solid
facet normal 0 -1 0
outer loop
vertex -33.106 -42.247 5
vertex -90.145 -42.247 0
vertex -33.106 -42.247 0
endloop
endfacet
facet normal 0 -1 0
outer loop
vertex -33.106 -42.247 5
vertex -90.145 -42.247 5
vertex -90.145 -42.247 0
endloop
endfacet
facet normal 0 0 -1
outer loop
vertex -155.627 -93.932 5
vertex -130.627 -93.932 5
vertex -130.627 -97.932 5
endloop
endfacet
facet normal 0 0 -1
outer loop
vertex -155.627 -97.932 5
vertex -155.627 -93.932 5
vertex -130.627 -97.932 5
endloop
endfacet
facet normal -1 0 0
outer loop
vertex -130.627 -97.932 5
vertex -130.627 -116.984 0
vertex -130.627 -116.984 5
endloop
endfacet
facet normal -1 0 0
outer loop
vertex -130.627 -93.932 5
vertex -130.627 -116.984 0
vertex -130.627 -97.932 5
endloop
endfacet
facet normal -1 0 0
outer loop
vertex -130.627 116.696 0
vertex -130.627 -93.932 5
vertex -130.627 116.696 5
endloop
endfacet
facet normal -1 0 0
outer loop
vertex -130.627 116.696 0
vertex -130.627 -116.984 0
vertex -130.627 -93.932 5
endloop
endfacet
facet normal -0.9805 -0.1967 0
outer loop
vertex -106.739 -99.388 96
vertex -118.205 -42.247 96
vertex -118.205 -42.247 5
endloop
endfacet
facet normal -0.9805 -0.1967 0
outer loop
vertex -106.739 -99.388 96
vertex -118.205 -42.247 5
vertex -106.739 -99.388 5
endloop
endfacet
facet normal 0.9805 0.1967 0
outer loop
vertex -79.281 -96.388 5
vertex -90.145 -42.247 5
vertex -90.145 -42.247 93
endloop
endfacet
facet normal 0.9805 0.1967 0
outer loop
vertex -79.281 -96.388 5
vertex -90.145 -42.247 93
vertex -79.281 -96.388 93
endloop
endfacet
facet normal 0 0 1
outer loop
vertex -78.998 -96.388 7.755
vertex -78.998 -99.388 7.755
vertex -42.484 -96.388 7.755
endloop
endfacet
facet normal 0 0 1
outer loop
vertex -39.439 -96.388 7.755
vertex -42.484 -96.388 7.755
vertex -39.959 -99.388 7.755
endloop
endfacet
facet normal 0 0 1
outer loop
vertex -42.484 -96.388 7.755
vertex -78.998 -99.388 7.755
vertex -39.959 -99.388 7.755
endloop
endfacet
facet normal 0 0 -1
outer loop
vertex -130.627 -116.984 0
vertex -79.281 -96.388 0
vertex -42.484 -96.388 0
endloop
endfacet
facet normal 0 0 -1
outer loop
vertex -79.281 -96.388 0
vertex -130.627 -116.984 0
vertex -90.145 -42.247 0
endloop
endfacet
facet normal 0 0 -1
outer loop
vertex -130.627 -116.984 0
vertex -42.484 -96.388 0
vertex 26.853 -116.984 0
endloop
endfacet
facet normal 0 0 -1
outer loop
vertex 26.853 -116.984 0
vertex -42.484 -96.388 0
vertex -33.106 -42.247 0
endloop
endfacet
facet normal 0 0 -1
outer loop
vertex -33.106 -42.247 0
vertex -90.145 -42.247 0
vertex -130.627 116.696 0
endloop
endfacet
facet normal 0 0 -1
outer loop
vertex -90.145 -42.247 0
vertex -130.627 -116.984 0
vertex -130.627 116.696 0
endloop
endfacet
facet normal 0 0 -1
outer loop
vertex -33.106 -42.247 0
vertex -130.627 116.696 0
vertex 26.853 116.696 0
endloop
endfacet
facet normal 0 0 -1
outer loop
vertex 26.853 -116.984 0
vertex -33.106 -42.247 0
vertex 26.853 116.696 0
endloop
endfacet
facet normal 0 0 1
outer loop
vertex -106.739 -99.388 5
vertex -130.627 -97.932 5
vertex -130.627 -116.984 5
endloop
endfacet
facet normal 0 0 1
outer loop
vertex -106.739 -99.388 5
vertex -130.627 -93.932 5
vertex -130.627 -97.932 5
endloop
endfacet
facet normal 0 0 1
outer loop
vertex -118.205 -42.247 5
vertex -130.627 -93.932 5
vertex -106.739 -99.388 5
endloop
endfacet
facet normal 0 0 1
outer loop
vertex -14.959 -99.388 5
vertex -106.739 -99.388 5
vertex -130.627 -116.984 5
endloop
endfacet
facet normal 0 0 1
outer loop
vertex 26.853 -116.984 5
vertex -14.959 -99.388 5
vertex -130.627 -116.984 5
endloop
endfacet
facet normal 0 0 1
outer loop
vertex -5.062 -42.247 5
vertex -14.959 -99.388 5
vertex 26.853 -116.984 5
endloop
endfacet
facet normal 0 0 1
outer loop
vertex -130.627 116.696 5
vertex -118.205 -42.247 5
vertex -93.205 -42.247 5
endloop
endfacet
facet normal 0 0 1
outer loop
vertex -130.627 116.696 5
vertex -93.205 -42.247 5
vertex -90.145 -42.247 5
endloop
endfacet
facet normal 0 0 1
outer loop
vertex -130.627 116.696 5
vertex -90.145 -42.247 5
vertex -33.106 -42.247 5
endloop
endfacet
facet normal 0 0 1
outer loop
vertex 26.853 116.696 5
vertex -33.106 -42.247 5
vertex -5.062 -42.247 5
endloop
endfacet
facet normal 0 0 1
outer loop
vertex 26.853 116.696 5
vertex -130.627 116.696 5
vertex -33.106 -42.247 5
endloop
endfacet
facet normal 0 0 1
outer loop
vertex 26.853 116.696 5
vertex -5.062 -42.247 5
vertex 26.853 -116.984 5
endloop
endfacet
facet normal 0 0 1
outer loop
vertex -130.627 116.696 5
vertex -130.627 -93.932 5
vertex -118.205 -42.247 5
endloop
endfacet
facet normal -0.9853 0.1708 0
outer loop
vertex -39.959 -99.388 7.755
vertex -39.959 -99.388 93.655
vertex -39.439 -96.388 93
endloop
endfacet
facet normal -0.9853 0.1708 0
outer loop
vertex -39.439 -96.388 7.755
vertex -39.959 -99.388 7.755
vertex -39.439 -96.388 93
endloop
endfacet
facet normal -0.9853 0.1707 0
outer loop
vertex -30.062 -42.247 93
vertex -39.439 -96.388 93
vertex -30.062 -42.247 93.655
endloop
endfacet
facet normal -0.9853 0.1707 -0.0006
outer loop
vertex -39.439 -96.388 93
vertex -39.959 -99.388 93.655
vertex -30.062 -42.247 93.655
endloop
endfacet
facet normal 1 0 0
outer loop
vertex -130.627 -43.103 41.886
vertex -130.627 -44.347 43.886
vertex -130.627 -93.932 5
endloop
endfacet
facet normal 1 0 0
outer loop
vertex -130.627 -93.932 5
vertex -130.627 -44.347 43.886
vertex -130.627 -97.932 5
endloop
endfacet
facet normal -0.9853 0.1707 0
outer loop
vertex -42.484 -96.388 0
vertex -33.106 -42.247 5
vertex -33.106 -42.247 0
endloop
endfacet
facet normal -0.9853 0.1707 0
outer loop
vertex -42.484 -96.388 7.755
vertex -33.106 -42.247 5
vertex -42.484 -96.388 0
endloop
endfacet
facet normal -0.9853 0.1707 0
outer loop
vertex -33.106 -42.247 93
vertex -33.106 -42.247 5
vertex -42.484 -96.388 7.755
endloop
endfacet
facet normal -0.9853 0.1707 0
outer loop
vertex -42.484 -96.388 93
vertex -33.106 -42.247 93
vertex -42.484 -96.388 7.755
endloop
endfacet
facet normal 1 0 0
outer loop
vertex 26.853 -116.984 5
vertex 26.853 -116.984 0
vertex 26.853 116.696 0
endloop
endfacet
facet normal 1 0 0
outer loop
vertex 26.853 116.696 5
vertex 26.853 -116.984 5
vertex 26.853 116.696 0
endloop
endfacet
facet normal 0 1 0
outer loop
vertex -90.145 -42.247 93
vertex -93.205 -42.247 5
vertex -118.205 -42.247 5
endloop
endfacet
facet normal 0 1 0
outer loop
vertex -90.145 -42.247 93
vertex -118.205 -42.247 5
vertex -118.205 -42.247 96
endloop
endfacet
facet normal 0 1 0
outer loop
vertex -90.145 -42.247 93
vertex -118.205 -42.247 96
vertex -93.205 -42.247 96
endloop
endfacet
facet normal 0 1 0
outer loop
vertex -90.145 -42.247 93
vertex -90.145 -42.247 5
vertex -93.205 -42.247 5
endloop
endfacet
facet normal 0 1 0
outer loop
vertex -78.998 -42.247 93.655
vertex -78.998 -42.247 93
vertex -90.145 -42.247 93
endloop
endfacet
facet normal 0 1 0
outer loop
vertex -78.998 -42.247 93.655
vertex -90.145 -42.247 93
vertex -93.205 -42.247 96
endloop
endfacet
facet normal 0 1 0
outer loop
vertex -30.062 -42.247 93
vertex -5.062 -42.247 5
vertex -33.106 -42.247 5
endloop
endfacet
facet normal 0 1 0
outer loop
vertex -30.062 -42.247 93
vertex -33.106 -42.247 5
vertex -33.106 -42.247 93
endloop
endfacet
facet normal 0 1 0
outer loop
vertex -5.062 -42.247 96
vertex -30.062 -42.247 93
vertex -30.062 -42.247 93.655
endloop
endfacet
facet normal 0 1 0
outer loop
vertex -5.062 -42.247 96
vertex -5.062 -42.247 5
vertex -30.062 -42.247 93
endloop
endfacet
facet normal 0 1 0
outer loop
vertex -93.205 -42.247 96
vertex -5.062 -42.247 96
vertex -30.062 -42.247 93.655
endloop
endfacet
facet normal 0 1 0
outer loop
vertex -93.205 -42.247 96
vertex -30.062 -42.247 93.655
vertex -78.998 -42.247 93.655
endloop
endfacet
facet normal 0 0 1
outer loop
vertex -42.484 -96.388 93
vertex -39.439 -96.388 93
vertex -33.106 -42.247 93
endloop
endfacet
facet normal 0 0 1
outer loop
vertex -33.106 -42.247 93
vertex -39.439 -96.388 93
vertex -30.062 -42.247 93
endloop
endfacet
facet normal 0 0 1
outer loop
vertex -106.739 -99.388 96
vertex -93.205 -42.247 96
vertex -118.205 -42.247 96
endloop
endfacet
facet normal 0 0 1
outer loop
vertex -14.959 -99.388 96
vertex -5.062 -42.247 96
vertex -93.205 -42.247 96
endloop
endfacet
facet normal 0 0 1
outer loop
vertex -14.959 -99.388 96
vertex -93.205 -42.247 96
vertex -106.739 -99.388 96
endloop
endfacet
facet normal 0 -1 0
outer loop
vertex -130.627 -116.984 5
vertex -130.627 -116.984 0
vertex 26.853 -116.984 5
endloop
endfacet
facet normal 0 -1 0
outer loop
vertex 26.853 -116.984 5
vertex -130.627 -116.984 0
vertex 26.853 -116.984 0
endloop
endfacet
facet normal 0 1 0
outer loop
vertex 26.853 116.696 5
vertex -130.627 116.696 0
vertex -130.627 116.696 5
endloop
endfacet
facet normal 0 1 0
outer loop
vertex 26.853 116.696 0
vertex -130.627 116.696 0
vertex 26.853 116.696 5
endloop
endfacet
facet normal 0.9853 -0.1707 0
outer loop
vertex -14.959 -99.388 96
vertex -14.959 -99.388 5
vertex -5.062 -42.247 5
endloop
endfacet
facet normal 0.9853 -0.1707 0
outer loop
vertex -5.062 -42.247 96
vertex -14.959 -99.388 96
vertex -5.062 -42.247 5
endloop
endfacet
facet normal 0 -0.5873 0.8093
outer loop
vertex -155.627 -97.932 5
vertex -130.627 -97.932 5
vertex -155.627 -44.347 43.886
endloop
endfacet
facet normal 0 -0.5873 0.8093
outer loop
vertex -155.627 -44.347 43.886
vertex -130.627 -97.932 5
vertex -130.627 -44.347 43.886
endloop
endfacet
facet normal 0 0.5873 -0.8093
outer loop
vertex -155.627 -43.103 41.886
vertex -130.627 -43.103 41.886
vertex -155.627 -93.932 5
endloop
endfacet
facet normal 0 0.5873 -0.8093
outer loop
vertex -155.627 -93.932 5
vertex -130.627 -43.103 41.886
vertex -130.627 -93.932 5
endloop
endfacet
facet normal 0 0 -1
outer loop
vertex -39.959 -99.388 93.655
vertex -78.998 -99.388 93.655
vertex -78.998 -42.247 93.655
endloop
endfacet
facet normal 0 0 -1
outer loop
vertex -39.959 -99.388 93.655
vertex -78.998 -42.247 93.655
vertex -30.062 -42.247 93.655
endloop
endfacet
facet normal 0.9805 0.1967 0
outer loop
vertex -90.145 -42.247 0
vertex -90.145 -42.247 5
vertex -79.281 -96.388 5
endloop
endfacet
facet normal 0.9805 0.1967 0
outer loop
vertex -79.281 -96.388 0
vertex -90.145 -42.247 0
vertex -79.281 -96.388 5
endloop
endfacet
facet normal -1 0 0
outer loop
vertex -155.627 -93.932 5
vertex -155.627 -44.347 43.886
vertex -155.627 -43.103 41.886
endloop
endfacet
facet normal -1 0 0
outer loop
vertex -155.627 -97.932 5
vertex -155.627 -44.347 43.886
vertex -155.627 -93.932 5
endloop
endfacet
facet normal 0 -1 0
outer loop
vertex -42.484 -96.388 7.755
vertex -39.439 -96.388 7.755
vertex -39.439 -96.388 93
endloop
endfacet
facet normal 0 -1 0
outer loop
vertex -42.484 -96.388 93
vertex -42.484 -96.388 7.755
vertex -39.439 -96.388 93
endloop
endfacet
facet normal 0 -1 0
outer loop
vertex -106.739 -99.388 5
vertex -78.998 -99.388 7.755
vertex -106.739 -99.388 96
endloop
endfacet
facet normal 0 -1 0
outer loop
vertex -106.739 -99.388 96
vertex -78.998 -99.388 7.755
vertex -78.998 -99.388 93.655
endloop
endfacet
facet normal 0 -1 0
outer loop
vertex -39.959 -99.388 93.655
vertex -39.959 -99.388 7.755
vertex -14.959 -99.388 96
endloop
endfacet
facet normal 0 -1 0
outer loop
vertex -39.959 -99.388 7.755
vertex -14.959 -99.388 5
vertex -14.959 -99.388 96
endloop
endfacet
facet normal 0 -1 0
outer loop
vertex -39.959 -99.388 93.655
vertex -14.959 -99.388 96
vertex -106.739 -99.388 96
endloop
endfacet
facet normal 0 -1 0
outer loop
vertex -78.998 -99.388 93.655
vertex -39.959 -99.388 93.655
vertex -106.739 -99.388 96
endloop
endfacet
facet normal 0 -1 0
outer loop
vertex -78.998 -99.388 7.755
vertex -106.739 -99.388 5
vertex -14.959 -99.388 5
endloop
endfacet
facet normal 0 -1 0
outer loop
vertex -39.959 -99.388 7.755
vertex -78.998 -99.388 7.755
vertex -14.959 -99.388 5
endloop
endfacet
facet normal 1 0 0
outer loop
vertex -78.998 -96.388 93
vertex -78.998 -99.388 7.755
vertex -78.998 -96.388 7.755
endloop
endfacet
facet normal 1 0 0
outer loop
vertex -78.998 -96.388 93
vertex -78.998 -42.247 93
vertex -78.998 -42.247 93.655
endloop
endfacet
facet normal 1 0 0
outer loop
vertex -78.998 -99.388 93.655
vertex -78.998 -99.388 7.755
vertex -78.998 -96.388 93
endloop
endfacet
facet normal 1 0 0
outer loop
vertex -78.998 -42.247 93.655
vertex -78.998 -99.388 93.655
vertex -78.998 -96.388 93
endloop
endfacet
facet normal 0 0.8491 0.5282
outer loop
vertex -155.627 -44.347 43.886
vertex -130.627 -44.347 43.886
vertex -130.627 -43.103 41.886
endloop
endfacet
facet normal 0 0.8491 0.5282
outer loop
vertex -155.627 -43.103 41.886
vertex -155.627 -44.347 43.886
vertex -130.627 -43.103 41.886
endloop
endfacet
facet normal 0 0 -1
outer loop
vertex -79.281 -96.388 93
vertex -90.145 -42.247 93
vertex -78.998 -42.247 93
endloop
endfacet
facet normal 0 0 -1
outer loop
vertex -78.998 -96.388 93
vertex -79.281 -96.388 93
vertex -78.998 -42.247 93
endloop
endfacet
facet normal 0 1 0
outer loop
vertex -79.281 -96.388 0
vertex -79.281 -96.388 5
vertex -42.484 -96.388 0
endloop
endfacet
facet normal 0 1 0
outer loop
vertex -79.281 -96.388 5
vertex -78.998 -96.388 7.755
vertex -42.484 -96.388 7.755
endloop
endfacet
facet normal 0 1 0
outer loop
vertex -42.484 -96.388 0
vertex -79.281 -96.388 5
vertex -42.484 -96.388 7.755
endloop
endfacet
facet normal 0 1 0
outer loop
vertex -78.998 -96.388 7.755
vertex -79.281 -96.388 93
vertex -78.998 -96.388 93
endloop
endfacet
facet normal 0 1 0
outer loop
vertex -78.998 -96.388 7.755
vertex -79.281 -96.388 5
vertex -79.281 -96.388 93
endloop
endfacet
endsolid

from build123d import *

# Parameters (mm, degrees)
F0_W        = 157.48
F0_H        = 233.68
F1_DEPTH    = 5
F3_DEPTH    = 91
F6_T        = 3
F6_T3_DEPTH = 64.2794708824
F6_T5_DEPTH = 72.7802281678
F6_T7_DEPTH = 63.9911646968
F4_W        = 61.3570176065
F4_H        = 85.9
F7_DEPTH    = 71
F8_DEPTH    = 27.4
F3_FACE1_W  = 58.2794708824
F3_FACE1_H  = 91
F3_FACE2_W  = 57.9911646968
F3_FACE2_H  = 91
F10_DEPTH   = 25


# Not quite as in the source:
# - a shell that OpenCascade refuses in one call is made with other operations: the cavity is built on its own and cut out


with BuildPart() as f1:
    # F0 (on Top) → F1 (new body)
    with BuildSketch(Plane.XY):
        with Locations((-51.8874652431, -0.1439023763)):
            Rectangle(F0_W, F0_H)
    extrude(amount=F1_DEPTH)

    # F2 (on face) → F3 (join)
    with BuildSketch(Plane.XY.offset(5)):
        Polygon((-93.2051390409, -42.2472283244), (-81.7390158772, -99.3876233697), (-14.9587877095, -99.3876233697), (-5.0617964007, -42.2472283244), align=None)
    extrude(amount=F3_DEPTH)

    # F6: shell of thickness 3, made by hand


with BuildPart() as f6_core1:
    # F6_t2: copy of F1
    add(f1.part)

    # the walls: a layer under each face that stays
    f6_faces = [f6_core1.faces().sort_by_distance(p)[0] for p in [
        (-51.8874652431, 116.6960976237, 2.5),
        (26.8525347569, -0.1439023763, 2.5),
        (-130.6274652431, -0.1439023763, 2.5),
        (-51.8874652431, -0.1439023763, 0),
        (-51.8874652431, -0.1439023763, 5),
        (-51.8874652431, -116.9839023763, 2.5),
        (-87.4720774591, -70.8174258471, 50.5),
        (-48.3489017934, -99.3876233697, 50.5),
        (-10.0102920551, -70.8174258471, 50.5),
        (-49.1334677208, -70.8174258471, 96),
    ]]
    thicken(f6_faces, amount=-F6_T, mode=Mode.SUBTRACT)

    # F6_s4 → F6_t3 (cut)
    with BuildSketch(Plane(origin=(3.9513966172, -19.6914301777, 0), x_dir=(0, 0, 1), z_dir=(0.196743776, -0.9804549386, 0))):
        Polygon((5.03, 99.7253181003), (2, 99.6953181003), (2, 96.6953181003), (5, 96.6953181003), align=None)
    extrude(amount=F6_T3_DEPTH, mode=Mode.SUBTRACT)

    # F6_s6 → F6_t5 (cut)
    with BuildSketch(Plane.YZ.offset(-84.7390158772)):
        Polygon((-99.4176233697, 5.03), (-99.3876233697, 2), (-96.3876233697, 2), (-96.3876233697, 5), align=None)
    extrude(amount=F6_T5_DEPTH, mode=Mode.SUBTRACT)

    # F6_s8 → F6_t7 (cut)
    with BuildSketch(Plane(origin=(-17.6607081625, -101.9643050803, 0), x_dir=(0, 0, 1), z_dir=(0.1706637789, 0.9853293229, 0))):
        Polygon((5.03, 2.2525352128), (2, 2.2225352128), (2, -0.7774647872), (5, -0.7774647872), align=None)
    extrude(amount=F6_T7_DEPTH, mode=Mode.SUBTRACT)


with BuildPart() as f1_1:
    add(f1.part)

    # what is left inside the walls is the cavity
    f6_cavity = [f6_core1.part.solids().sort_by_distance(p)[0] for p in [
        (-62.799045, -42.277228, 48),
    ]]
    add(f6_cavity, mode=Mode.SUBTRACT)

    # F4 (on face) → F7 (cut)
    with BuildSketch(Plane.XZ.offset(99.3876233697)):
        with Locations((-48.3198929578, 50.7050797723)):
            Rectangle(F4_W, F4_H)
    extrude(amount=-F7_DEPTH, mode=Mode.SUBTRACT)

    # F8 (cut): a face of the model
    f8_faces = [f1_1.faces().sort_by_distance(p)[0] for p in [
        (-48.771647492, -68.0475987274, 3),
    ]]
    extrude(f8_faces, amount=-F8_DEPTH, mode=Mode.SUBTRACT)

    # F9 (on face) + F3_face1 (on face) + F8_face (on face) + F8_face1 (on face) + F3_face2 (on face) → F10 (join)
    with BuildSketch(Plane(origin=(-130.6274652431, 0, 0), x_dir=(0, -1, 0), z_dir=(-1, 0, 0))):
        Polygon((93.9320304401, 5), (97.9320304401, 5), (44.34663196, 43.8861806393), (43.1026443839, 41.8861806393), align=None)
    with BuildSketch(Plane(origin=(-87.4720774591, -70.8174258471, 50.5), x_dir=(0.196743776, -0.9804549386, 0), z_dir=(-0.9804549386, -0.196743776, 0))):
        Rectangle(F3_FACE1_W, F3_FACE1_H)
    with BuildSketch(Plane(origin=(-84.7132721029, -69.3174258471, 46.5), x_dir=(-0.196743776, 0.9804549386, 0), z_dir=(0.9804549386, 0.196743776, 0))):
        Polygon((-27.6098334121, 46.5), (-27.6098334121, -46.5), (27.6098334121, -46.5), (27.6098334121, -41.5), (27.6098334121, 46.5), align=None)
    with BuildSketch(Plane(origin=(-12.7951521703, -69.3174258471, 46.5), x_dir=(-0.1706637789, -0.9853293229, 0), z_dir=(-0.9853293229, 0.1706637789, 0))):
        Polygon((-27.4732486828, -41.5), (-27.4732486828, -46.5), (27.4732486828, -46.5), (27.4732486828, 46.5), (-27.4732486828, 46.5), align=None)
    with BuildSketch(Plane(origin=(-10.0102920551, -70.8174258471, 50.5), x_dir=(0.1706637789, 0.9853293229, 0), z_dir=(0.9853293229, -0.1706637789, 0))):
        Rectangle(F3_FACE2_W, F3_FACE2_H)
    extrude(amount=F10_DEPTH, dir=(-1, 0, 0))


solid = f1_1.part
